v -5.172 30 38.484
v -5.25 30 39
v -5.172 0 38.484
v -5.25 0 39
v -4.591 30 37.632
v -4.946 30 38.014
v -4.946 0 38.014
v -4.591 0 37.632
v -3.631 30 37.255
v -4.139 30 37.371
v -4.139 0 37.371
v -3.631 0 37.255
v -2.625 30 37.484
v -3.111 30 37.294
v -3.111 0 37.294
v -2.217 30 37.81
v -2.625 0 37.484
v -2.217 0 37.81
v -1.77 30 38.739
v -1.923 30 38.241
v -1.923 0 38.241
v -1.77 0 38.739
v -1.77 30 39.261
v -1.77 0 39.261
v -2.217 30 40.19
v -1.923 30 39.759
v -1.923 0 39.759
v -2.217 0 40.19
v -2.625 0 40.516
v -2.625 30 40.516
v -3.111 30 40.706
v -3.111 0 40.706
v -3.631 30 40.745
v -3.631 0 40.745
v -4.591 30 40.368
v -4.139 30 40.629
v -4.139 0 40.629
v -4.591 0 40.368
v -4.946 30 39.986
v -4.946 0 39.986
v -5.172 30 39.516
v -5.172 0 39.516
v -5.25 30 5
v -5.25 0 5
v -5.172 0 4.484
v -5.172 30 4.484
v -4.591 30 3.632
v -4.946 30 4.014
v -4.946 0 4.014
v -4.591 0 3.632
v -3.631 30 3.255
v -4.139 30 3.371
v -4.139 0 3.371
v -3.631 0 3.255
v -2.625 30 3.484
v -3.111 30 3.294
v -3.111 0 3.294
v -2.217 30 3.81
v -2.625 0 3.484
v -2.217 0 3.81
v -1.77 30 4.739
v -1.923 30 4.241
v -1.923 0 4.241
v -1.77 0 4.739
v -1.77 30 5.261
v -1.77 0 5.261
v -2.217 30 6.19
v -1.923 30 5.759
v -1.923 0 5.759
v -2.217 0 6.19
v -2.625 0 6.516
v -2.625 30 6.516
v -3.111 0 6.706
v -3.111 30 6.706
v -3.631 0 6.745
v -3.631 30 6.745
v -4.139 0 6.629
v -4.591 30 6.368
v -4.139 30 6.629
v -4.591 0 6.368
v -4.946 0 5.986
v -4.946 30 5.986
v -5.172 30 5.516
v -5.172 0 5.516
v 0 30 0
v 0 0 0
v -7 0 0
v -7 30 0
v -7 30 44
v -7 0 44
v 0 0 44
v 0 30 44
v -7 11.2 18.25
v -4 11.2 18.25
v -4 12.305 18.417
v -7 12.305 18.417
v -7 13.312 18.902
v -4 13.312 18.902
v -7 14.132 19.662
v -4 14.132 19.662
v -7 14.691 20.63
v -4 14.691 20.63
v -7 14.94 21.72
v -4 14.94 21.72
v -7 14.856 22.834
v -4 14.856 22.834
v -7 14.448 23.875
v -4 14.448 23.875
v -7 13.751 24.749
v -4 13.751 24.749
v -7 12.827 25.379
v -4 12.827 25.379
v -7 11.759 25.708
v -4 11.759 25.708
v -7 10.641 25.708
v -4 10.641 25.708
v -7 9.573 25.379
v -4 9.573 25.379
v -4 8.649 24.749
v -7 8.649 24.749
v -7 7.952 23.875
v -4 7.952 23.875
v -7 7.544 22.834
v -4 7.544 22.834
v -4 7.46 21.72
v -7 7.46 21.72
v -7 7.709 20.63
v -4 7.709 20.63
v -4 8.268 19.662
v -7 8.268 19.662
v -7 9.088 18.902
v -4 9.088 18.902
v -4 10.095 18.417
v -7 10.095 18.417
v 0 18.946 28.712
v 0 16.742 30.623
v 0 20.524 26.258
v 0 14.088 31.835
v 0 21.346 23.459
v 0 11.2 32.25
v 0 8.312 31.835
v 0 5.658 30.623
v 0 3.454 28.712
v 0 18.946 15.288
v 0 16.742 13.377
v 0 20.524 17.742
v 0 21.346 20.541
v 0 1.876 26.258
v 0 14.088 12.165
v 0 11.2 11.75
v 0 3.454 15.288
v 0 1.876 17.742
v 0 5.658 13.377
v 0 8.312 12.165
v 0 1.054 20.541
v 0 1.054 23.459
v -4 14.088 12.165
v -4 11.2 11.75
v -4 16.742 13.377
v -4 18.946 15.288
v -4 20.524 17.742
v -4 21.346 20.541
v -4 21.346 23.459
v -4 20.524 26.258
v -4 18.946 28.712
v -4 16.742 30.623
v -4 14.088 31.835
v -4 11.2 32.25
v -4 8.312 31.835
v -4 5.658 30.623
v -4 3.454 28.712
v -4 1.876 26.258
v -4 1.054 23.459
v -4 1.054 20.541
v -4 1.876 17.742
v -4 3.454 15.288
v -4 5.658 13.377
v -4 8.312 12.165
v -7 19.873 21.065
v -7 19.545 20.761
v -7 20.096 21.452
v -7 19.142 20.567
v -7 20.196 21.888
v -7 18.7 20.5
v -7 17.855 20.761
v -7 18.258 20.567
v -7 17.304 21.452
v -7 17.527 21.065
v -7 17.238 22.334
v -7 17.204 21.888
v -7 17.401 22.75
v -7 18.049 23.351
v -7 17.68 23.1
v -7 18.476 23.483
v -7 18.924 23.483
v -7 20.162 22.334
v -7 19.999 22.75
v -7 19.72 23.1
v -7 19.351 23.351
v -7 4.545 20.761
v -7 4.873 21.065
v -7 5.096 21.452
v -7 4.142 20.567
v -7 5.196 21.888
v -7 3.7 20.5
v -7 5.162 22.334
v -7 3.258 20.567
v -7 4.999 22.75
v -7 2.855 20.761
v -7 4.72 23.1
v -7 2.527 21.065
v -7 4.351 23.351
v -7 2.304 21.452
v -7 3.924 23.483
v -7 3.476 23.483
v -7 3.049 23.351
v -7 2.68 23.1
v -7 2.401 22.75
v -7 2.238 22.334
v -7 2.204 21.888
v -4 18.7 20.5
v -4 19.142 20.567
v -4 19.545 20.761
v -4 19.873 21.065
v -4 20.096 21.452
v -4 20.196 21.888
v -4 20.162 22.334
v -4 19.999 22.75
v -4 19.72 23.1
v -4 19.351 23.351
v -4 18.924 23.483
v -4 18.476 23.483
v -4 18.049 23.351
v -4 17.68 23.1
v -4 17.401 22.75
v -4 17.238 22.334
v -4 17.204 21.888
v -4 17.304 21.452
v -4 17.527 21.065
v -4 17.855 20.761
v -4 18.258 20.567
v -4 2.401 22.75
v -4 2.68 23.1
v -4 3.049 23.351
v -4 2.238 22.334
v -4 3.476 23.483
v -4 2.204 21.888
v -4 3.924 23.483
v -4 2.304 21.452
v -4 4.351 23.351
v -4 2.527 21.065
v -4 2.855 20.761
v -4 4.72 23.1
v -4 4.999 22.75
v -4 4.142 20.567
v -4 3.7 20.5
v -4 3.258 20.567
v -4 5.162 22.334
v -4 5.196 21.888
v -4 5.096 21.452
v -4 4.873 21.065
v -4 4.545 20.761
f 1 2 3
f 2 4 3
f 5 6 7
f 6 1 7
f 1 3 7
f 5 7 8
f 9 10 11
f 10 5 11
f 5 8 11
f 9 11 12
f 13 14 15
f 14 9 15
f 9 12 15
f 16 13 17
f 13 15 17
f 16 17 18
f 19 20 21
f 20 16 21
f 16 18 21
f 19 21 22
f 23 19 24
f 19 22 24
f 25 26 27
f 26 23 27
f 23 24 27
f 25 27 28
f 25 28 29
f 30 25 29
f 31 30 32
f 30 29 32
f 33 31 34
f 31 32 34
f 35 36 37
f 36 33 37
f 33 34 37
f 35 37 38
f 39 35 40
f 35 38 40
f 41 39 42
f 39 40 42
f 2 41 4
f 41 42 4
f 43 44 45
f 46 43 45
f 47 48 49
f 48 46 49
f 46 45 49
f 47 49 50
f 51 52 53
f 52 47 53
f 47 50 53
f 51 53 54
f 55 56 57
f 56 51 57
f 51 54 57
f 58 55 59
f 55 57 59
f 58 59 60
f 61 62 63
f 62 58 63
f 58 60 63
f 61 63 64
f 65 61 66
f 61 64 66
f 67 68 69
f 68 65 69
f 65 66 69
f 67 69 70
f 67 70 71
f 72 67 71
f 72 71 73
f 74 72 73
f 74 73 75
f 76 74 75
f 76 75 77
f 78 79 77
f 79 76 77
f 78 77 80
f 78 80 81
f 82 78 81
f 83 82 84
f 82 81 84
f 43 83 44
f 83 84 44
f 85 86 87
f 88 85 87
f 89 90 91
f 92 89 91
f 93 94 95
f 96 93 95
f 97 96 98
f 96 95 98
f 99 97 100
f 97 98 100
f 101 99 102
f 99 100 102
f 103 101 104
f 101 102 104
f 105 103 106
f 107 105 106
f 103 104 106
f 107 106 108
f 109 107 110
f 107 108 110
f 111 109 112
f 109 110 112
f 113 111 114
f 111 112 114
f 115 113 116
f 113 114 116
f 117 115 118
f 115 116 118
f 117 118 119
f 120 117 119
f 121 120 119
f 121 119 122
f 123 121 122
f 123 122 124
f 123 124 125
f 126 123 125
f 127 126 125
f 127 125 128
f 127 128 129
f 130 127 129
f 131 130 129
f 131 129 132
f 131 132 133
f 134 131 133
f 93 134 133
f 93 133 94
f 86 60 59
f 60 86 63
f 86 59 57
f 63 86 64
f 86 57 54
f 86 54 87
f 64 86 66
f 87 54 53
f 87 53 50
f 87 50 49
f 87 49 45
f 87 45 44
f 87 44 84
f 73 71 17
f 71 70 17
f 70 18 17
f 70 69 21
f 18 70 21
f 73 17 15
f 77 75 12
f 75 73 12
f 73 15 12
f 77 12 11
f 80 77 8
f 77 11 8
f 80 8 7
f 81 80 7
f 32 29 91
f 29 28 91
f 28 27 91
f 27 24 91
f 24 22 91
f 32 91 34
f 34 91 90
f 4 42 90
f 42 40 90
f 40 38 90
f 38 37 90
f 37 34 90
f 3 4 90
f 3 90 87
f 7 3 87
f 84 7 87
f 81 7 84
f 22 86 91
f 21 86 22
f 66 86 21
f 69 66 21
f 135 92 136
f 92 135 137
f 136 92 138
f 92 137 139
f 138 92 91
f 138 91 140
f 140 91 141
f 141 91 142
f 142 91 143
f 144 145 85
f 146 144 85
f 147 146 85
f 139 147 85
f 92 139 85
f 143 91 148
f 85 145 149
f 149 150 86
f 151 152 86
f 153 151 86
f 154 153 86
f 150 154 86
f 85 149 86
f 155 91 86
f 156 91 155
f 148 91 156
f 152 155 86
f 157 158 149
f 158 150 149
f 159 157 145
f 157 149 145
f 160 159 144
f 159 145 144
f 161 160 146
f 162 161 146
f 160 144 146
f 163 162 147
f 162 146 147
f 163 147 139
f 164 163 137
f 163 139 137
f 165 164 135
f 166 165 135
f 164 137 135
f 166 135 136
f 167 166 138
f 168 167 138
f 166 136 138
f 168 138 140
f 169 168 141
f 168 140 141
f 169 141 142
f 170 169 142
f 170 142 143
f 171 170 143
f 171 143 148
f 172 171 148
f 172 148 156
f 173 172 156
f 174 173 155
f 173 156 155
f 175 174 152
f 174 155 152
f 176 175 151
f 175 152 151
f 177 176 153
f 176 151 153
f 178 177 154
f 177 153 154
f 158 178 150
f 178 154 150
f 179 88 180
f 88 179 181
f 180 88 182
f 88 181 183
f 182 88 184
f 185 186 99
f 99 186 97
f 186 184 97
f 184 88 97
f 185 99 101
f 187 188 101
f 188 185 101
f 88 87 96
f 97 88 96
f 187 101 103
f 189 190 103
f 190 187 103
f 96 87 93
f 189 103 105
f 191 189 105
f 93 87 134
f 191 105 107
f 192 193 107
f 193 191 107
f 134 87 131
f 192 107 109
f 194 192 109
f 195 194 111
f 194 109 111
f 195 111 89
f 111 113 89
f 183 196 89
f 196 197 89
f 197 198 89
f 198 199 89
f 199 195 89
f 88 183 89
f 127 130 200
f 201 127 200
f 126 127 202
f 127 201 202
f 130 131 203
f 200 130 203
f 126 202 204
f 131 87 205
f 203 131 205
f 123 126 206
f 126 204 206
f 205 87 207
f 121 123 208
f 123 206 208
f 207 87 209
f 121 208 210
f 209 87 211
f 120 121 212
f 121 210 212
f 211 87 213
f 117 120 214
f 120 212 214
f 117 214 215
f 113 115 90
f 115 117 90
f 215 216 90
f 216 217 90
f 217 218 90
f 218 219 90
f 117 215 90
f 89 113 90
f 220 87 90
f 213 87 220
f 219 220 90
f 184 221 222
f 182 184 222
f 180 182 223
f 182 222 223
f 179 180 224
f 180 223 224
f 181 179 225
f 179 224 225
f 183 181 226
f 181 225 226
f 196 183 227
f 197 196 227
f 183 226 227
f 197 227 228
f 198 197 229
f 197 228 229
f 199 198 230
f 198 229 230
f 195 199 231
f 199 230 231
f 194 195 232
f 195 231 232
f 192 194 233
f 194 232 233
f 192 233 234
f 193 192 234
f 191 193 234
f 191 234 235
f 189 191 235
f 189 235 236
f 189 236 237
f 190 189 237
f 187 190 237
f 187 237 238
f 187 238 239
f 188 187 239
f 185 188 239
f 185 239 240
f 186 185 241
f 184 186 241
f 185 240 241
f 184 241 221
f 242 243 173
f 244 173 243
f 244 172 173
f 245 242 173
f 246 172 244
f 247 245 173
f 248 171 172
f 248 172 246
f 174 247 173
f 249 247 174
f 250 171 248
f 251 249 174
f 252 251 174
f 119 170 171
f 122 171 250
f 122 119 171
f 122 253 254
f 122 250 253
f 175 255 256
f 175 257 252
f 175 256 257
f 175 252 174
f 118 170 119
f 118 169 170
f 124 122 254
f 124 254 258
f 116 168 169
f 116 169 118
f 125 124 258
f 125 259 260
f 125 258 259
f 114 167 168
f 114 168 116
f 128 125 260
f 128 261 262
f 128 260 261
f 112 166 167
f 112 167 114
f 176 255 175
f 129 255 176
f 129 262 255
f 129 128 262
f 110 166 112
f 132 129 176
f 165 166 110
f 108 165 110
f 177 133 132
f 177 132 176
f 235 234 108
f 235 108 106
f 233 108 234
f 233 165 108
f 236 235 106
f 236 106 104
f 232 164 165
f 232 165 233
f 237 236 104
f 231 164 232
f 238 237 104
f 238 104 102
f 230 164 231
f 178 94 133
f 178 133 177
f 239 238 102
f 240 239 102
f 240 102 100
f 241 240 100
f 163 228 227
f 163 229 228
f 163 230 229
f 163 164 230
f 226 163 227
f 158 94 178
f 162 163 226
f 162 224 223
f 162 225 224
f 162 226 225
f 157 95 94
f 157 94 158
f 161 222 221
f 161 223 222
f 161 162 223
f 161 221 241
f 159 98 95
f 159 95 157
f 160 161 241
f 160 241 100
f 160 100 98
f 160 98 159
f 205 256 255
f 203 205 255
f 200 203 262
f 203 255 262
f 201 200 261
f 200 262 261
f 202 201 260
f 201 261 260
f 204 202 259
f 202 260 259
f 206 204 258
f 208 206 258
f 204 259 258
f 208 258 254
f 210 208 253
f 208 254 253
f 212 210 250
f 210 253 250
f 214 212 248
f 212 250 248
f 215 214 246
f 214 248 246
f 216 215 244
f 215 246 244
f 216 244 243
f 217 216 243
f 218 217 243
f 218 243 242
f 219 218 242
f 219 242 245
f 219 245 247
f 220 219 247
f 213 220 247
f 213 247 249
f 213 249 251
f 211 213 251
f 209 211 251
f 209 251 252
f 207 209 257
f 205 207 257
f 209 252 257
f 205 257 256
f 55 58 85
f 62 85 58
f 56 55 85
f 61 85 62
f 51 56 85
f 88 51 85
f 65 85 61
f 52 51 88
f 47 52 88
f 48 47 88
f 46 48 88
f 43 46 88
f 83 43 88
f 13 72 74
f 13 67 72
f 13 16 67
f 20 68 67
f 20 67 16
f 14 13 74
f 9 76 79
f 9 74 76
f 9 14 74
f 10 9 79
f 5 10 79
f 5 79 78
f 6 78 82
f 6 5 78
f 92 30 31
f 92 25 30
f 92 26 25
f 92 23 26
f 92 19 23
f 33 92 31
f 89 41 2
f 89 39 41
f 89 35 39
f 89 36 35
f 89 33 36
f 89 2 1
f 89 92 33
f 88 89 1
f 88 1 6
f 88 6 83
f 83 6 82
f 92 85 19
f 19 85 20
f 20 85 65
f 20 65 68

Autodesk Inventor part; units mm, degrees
ref_plane "YZ Plane" through (0, 0, 0) normal (1, 0, 0) x (0, 1, 0)
ref_plane "XZ Plane" through (0, 0, 0) normal (0, 1, 0) x (-1, 0, 0)
ref_plane "XY Plane" through (0, 0, 0) normal (0, 0, 1) x (1, 0, 0)
sketch "Эскиз1" plane through (0, 0, 0) normal (0, 1, 0) x (-1, 0, 0)
  line L0 (7, 44) -> (0, 44)
  line L1 (0, 44) -> (0, 0)
  line L2 (0, 0) -> (7, 0)
  line L3 (7, 0) -> (7, 44)
  line L4 (-16.3445, 0) -> (14.925, 0) construction
  line L5 (0, 24.3748) -> (0, -24.0504) construction
  circle A0 centre (3.5, 39) radius 1.75
  line L6 (3.5, 44) -> (3.5, 0) construction
  line L7 (7, 22) -> (0, 22) construction
  circle A1 centre (3.5, 5) radius 1.75
  point P0 (0, 0)
  dimension "d0" = 44
  dimension "d1" = 7
  dimension "d2" = 3.5
  dimension "d5" = 34
extrude "Выдавливание1" add sketch "Эскиз1" along normal blind 30
sketch "Эскиз2" plane through (0, 0, 44) normal (1, 0, 0) x (0, 0, -1)
  line L0 (0, 0) -> (44, 0) construction
  line L1 (44, 0) -> (44, 30) construction
  line L2 (0, 30) -> (44, 30) construction
  line L3 (0, 0) -> (0, 30) construction
  line L4 (44, 30) -> (0, 30) construction
  line L5 (22, 30) -> (22, 0) construction
  line L6 (44, 0) -> (0, 0) construction
  line L7 (0, 0) -> (0, 30) construction
  line L8 (0, 15) -> (44, 15) construction
  line L9 (44, 0) -> (44, 30) construction
  circle A0 centre (22, 11.2) radius 10.25
  circle A1 centre (22, 11.2) radius 3.75
  circle A2 centre (22, 18.7) radius 1.5
  line L10 (18.25, 11.2) -> (25.75, 11.2) construction
  circle A3 centre (22, 3.7) radius 1.5
  dimension "d8" = 20.5
  dimension "d9" = 11.2
  dimension "d10" = 7.5
  dimension "d11" = 3
  dimension "d12" = 15
extrude "Выдавливание2" cut sketch "Эскиз2" against normal blind 30 contours A1 | A2 | A3
extrude "Выдавливание3" cut sketch "Эскиз2" against normal blind 4
properties part number "motor_front"
